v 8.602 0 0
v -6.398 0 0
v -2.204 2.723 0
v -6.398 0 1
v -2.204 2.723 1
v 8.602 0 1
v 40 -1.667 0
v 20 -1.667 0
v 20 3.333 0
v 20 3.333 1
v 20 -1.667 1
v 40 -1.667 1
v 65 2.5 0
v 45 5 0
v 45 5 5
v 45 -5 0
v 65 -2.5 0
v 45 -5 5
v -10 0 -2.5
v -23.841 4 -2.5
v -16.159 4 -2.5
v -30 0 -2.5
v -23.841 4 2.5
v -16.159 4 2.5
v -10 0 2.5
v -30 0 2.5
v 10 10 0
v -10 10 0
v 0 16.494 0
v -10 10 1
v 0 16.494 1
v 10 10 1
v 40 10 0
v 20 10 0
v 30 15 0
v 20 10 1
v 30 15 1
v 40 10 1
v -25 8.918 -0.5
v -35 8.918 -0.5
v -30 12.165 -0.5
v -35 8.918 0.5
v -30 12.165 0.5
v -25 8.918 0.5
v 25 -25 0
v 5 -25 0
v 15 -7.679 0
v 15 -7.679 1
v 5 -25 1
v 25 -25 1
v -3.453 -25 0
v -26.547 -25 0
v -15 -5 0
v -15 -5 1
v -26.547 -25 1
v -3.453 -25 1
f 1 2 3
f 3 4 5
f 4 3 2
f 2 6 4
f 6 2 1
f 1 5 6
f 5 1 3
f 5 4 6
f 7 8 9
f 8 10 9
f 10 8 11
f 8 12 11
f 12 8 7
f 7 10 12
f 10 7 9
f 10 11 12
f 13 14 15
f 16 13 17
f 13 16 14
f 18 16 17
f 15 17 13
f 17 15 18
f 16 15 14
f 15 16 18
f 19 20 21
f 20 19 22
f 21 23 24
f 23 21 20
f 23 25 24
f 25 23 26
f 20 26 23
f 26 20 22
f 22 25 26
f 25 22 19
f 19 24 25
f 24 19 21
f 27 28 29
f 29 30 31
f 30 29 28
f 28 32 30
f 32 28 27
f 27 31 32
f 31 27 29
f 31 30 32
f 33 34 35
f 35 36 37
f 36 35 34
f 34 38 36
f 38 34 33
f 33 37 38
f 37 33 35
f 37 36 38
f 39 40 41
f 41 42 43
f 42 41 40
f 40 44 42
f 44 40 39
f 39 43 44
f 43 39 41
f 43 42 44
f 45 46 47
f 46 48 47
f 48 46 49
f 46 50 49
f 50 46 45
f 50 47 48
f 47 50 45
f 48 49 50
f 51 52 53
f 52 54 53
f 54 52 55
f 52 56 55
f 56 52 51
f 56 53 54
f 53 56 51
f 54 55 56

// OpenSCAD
/*
Triangles.scad
 Author: Tim Koopman
 https://github.com/tkoopman/Delta-Diamond/blob/master/OpenSCAD/Triangles.scad

         angleCA
           /|\
        a / H \ c
         /  |  \
 angleAB ------- angleBC
            b

Standard Parameters
	center: true/false
		If true same as centerXYZ = [true, true, true]

	centerXYZ: Vector of 3 true/false values [CenterX, CenterY, CenterZ]
		center must be left undef

	height: The 3D height of the Triangle. Ignored if heights defined

	heights: Vector of 3 height values heights @ [angleAB, angleBC, angleCA]
		If CenterZ is true each height will be centered individually, this means
		the shape will be different depending on CenterZ. Most times you will want
		CenterZ to be true to get the shape most people want.
*/

/* 
Triangle
	a: Length of side a
	b: Length of side b
	angle: angle at point angleAB
*/
module Triangle(
			a, b, angle, height=1, heights=undef,
			center=undef, centerXYZ=[false,false,false])
{
	// Calculate Heights at each point
	heightAB = ((heights==undef) ? height : heights[0])/2;
	heightBC = ((heights==undef) ? height : heights[1])/2;
	heightCA = ((heights==undef) ? height : heights[2])/2;
	centerZ = (center || (center==undef && centerXYZ[2]))?0:max(heightAB,heightBC,heightCA);

	// Calculate Offsets for centering
	offsetX = (center || (center==undef && centerXYZ[0]))?((cos(angle)*a)+b)/3:0;
	offsetY = (center || (center==undef && centerXYZ[1]))?(sin(angle)*a)/3:0;
	
	pointAB1 = [-offsetX,-offsetY, centerZ-heightAB];
	pointAB2 = [-offsetX,-offsetY, centerZ+heightAB];
	pointBC1 = [b-offsetX,-offsetY, centerZ-heightBC];
	pointBC2 = [b-offsetX,-offsetY, centerZ+heightBC];
	pointCA1 = [(cos(angle)*a)-offsetX,(sin(angle)*a)-offsetY, centerZ-heightCA];
	pointCA2 = [(cos(angle)*a)-offsetX,(sin(angle)*a)-offsetY, centerZ+heightCA];

	polyhedron(
		points=[	pointAB1, pointBC1, pointCA1,
					pointAB2, pointBC2, pointCA2 ],
		triangles=[	
			[0, 1, 2],
			[3, 5, 4],
			[0, 3, 1],
			[1, 3, 4],
			[1, 4, 2],
			[2, 4, 5],
			[2, 5, 0],
			[0, 5, 3] ] );
}

/*
Isosceles Triangle
	Exactly 2 of the following paramaters must be defined.
	If all 3 defined H will be ignored.
	b: length of side b
	angle: angle at points angleAB & angleBC.
*/
module Isosceles_Triangle(
			b, angle, H=undef, height=1, heights=undef,
			center=undef, centerXYZ=[true, false, false])
{
	valid = 	(angle!=undef)?((angle < 90) && (b!=undef||H!=undef)) : (b!=undef&&H!=undef);
	ANGLE = (angle!=undef) ? angle : atan(H / (b/2));
	a = (b==undef)?(H/sin((180-(angle*2))/2)) : 
		 (b / cos(ANGLE))/2;
	B = (b==undef)? (cos(angle)*a)*2:b;
	if (valid)
	{
		Triangle(a=a, b=B, angle=ANGLE, height=height, heights=heights,
					center=center, centerXYZ=centerXYZ);
	} else {
		echo("Invalid Isosceles_Triangle. Must specify any 2 of b, angle and H, and if angle used angle must be less than 90");
	}
}

/*
Right Angled Triangle
	Create a Right Angled Triangle where the hypotenuse will be calculated.

       |\
      a| \
       |  \
       ----
         b
	a: length of side a
	b: length of side b
*/
module Right_Angled_Triangle(
			a, b, height=1, heights=undef,
			center=undef, centerXYZ=[false, false, false])
{
	Triangle(a=a, b=b, angle=90, height=height, heights=heights,
				center=center, centerXYZ=centerXYZ);
}

/*
Wedge
	Is same as Right Angled Triangle with 2 different heights, and rotated.
	Good for creating support structures.
*/
module Wedge(a, b, w1, w2)
{
	rotate([90,0,0])
		Right_Angled_Triangle(a, b, heights=[w1, w2, w1], centerXYZ=[false, false, true]);
}

/*
Equilateral Triangle
	Create a Equilateral Triangle.

	l: Length of all sides (a, b & c)
	H: Triangle size will be based on the this 2D height
		When using H, l is ignored.
*/
module Equilateral_Triangle(
			l=10, H=undef, height=1, heights=undef,
			center=undef, centerXYZ=[true,false,false])
{
	L = (H==undef)?l:H/sin(60);
	Triangle(a=L,b=L,angle=60,height=height, heights=heights,
				center=center, centerXYZ=centerXYZ);
}

/*
Trapezoid
	Create a Basic Trapezoid (Based on Isosceles_Triangle)

            d
          /----\
         /  |   \
     a  /   H    \ c
       /    |     \
 angle ------------ angle
            b

	b: Length of side b
	angle: Angle at points angleAB & angleBC
	H: The 2D height at which the triangle should be cut to create the trapezoid
	heights: If vector of size 3 (Standard for triangles) both cd & da will be the same height, if vector have 4 values [ab,bc,cd,da] than each point can have different heights.
*/
module Trapezoid(
			b, angle=60, H, height=1, heights=undef,
			center=undef, centerXYZ=[true,false,false])
{
	validAngle = (angle < 90);
	adX = H / tan(angle);

	// Calculate Heights at each point
	heightAB = ((heights==undef) ? height : heights[0])/2;
	heightBC = ((heights==undef) ? height : heights[1])/2;
	heightCD = ((heights==undef) ? height : heights[2])/2;
	heightDA = ((heights==undef) ? height : ((len(heights) > 3)?heights[3]:heights[2]))/2;

	// Centers
	centerX = (center || (center==undef && centerXYZ[0]))?0:b/2;
	centerY = (center || (center==undef && centerXYZ[1]))?0:H/2;
	centerZ = (center || (center==undef && centerXYZ[2]))?0:max(heightAB,heightBC,heightCD,heightDA);

	// Points
	y = H/2;
	bx = b/2;
	dx = (b-(adX*2))/2;

	pointAB1 = [centerX-bx, centerY-y, centerZ-heightAB];
	pointAB2 = [centerX-bx, centerY-y, centerZ+heightAB];
	pointBC1 = [centerX+bx, centerY-y, centerZ-heightBC];
	pointBC2 = [centerX+bx, centerY-y, centerZ+heightBC];
	pointCD1 = [centerX+dx, centerY+y, centerZ-heightCD];
	pointCD2 = [centerX+dx, centerY+y, centerZ+heightCD];
	pointDA1 = [centerX-dx, centerY+y, centerZ-heightDA];
	pointDA2 = [centerX-dx, centerY+y, centerZ+heightDA];

	validH = (adX < b/2);

	if (validAngle && validH)
	{
		polyhedron(
			points=[	pointAB1, pointBC1, pointCD1, pointDA1,
						pointAB2, pointBC2, pointCD2, pointDA2 ],
			triangles=[	
				[0, 1, 2],
				[0, 2, 3],
				[4, 6, 5],
				[4, 7, 6],
				[0, 4, 1],
				[1, 4, 5],
				[1, 5, 2],
				[2, 5, 6],
				[2, 6, 3],
				[3, 6, 7],
				[3, 7, 0],
				[0, 7, 4]	] );
	} else {
		if (!validAngle) echo("Trapezoid invalid, angle must be less than 90");
		else echo("Trapezoid invalid, H is larger than triangle");
	}
}


// Examples
Triangle(a=5, b=15, angle=33, centerXYZ=[true,false,false]);
translate([20,0,0]) Right_Angled_Triangle(a=5, b=20, centerXYZ=[false,true,false]);
translate([45,0,0]) Wedge(a=5, b=20, w1=10, w2=5);
translate([-20,0,0]) Trapezoid(b=20, angle=33, H=4, height=5, centerXYZ=[true,false,true]);

translate([0,10,0]) Isosceles_Triangle(b=20, angle=33);
translate([30,10,0]) Isosceles_Triangle(b=20, H=5);
translate([-30,10,0]) Isosceles_Triangle(angle=33, H=5, center=true);

translate([15,-25,0]) Equilateral_Triangle(l=20);
translate([-15,-25,0]) Equilateral_Triangle(H=20);
